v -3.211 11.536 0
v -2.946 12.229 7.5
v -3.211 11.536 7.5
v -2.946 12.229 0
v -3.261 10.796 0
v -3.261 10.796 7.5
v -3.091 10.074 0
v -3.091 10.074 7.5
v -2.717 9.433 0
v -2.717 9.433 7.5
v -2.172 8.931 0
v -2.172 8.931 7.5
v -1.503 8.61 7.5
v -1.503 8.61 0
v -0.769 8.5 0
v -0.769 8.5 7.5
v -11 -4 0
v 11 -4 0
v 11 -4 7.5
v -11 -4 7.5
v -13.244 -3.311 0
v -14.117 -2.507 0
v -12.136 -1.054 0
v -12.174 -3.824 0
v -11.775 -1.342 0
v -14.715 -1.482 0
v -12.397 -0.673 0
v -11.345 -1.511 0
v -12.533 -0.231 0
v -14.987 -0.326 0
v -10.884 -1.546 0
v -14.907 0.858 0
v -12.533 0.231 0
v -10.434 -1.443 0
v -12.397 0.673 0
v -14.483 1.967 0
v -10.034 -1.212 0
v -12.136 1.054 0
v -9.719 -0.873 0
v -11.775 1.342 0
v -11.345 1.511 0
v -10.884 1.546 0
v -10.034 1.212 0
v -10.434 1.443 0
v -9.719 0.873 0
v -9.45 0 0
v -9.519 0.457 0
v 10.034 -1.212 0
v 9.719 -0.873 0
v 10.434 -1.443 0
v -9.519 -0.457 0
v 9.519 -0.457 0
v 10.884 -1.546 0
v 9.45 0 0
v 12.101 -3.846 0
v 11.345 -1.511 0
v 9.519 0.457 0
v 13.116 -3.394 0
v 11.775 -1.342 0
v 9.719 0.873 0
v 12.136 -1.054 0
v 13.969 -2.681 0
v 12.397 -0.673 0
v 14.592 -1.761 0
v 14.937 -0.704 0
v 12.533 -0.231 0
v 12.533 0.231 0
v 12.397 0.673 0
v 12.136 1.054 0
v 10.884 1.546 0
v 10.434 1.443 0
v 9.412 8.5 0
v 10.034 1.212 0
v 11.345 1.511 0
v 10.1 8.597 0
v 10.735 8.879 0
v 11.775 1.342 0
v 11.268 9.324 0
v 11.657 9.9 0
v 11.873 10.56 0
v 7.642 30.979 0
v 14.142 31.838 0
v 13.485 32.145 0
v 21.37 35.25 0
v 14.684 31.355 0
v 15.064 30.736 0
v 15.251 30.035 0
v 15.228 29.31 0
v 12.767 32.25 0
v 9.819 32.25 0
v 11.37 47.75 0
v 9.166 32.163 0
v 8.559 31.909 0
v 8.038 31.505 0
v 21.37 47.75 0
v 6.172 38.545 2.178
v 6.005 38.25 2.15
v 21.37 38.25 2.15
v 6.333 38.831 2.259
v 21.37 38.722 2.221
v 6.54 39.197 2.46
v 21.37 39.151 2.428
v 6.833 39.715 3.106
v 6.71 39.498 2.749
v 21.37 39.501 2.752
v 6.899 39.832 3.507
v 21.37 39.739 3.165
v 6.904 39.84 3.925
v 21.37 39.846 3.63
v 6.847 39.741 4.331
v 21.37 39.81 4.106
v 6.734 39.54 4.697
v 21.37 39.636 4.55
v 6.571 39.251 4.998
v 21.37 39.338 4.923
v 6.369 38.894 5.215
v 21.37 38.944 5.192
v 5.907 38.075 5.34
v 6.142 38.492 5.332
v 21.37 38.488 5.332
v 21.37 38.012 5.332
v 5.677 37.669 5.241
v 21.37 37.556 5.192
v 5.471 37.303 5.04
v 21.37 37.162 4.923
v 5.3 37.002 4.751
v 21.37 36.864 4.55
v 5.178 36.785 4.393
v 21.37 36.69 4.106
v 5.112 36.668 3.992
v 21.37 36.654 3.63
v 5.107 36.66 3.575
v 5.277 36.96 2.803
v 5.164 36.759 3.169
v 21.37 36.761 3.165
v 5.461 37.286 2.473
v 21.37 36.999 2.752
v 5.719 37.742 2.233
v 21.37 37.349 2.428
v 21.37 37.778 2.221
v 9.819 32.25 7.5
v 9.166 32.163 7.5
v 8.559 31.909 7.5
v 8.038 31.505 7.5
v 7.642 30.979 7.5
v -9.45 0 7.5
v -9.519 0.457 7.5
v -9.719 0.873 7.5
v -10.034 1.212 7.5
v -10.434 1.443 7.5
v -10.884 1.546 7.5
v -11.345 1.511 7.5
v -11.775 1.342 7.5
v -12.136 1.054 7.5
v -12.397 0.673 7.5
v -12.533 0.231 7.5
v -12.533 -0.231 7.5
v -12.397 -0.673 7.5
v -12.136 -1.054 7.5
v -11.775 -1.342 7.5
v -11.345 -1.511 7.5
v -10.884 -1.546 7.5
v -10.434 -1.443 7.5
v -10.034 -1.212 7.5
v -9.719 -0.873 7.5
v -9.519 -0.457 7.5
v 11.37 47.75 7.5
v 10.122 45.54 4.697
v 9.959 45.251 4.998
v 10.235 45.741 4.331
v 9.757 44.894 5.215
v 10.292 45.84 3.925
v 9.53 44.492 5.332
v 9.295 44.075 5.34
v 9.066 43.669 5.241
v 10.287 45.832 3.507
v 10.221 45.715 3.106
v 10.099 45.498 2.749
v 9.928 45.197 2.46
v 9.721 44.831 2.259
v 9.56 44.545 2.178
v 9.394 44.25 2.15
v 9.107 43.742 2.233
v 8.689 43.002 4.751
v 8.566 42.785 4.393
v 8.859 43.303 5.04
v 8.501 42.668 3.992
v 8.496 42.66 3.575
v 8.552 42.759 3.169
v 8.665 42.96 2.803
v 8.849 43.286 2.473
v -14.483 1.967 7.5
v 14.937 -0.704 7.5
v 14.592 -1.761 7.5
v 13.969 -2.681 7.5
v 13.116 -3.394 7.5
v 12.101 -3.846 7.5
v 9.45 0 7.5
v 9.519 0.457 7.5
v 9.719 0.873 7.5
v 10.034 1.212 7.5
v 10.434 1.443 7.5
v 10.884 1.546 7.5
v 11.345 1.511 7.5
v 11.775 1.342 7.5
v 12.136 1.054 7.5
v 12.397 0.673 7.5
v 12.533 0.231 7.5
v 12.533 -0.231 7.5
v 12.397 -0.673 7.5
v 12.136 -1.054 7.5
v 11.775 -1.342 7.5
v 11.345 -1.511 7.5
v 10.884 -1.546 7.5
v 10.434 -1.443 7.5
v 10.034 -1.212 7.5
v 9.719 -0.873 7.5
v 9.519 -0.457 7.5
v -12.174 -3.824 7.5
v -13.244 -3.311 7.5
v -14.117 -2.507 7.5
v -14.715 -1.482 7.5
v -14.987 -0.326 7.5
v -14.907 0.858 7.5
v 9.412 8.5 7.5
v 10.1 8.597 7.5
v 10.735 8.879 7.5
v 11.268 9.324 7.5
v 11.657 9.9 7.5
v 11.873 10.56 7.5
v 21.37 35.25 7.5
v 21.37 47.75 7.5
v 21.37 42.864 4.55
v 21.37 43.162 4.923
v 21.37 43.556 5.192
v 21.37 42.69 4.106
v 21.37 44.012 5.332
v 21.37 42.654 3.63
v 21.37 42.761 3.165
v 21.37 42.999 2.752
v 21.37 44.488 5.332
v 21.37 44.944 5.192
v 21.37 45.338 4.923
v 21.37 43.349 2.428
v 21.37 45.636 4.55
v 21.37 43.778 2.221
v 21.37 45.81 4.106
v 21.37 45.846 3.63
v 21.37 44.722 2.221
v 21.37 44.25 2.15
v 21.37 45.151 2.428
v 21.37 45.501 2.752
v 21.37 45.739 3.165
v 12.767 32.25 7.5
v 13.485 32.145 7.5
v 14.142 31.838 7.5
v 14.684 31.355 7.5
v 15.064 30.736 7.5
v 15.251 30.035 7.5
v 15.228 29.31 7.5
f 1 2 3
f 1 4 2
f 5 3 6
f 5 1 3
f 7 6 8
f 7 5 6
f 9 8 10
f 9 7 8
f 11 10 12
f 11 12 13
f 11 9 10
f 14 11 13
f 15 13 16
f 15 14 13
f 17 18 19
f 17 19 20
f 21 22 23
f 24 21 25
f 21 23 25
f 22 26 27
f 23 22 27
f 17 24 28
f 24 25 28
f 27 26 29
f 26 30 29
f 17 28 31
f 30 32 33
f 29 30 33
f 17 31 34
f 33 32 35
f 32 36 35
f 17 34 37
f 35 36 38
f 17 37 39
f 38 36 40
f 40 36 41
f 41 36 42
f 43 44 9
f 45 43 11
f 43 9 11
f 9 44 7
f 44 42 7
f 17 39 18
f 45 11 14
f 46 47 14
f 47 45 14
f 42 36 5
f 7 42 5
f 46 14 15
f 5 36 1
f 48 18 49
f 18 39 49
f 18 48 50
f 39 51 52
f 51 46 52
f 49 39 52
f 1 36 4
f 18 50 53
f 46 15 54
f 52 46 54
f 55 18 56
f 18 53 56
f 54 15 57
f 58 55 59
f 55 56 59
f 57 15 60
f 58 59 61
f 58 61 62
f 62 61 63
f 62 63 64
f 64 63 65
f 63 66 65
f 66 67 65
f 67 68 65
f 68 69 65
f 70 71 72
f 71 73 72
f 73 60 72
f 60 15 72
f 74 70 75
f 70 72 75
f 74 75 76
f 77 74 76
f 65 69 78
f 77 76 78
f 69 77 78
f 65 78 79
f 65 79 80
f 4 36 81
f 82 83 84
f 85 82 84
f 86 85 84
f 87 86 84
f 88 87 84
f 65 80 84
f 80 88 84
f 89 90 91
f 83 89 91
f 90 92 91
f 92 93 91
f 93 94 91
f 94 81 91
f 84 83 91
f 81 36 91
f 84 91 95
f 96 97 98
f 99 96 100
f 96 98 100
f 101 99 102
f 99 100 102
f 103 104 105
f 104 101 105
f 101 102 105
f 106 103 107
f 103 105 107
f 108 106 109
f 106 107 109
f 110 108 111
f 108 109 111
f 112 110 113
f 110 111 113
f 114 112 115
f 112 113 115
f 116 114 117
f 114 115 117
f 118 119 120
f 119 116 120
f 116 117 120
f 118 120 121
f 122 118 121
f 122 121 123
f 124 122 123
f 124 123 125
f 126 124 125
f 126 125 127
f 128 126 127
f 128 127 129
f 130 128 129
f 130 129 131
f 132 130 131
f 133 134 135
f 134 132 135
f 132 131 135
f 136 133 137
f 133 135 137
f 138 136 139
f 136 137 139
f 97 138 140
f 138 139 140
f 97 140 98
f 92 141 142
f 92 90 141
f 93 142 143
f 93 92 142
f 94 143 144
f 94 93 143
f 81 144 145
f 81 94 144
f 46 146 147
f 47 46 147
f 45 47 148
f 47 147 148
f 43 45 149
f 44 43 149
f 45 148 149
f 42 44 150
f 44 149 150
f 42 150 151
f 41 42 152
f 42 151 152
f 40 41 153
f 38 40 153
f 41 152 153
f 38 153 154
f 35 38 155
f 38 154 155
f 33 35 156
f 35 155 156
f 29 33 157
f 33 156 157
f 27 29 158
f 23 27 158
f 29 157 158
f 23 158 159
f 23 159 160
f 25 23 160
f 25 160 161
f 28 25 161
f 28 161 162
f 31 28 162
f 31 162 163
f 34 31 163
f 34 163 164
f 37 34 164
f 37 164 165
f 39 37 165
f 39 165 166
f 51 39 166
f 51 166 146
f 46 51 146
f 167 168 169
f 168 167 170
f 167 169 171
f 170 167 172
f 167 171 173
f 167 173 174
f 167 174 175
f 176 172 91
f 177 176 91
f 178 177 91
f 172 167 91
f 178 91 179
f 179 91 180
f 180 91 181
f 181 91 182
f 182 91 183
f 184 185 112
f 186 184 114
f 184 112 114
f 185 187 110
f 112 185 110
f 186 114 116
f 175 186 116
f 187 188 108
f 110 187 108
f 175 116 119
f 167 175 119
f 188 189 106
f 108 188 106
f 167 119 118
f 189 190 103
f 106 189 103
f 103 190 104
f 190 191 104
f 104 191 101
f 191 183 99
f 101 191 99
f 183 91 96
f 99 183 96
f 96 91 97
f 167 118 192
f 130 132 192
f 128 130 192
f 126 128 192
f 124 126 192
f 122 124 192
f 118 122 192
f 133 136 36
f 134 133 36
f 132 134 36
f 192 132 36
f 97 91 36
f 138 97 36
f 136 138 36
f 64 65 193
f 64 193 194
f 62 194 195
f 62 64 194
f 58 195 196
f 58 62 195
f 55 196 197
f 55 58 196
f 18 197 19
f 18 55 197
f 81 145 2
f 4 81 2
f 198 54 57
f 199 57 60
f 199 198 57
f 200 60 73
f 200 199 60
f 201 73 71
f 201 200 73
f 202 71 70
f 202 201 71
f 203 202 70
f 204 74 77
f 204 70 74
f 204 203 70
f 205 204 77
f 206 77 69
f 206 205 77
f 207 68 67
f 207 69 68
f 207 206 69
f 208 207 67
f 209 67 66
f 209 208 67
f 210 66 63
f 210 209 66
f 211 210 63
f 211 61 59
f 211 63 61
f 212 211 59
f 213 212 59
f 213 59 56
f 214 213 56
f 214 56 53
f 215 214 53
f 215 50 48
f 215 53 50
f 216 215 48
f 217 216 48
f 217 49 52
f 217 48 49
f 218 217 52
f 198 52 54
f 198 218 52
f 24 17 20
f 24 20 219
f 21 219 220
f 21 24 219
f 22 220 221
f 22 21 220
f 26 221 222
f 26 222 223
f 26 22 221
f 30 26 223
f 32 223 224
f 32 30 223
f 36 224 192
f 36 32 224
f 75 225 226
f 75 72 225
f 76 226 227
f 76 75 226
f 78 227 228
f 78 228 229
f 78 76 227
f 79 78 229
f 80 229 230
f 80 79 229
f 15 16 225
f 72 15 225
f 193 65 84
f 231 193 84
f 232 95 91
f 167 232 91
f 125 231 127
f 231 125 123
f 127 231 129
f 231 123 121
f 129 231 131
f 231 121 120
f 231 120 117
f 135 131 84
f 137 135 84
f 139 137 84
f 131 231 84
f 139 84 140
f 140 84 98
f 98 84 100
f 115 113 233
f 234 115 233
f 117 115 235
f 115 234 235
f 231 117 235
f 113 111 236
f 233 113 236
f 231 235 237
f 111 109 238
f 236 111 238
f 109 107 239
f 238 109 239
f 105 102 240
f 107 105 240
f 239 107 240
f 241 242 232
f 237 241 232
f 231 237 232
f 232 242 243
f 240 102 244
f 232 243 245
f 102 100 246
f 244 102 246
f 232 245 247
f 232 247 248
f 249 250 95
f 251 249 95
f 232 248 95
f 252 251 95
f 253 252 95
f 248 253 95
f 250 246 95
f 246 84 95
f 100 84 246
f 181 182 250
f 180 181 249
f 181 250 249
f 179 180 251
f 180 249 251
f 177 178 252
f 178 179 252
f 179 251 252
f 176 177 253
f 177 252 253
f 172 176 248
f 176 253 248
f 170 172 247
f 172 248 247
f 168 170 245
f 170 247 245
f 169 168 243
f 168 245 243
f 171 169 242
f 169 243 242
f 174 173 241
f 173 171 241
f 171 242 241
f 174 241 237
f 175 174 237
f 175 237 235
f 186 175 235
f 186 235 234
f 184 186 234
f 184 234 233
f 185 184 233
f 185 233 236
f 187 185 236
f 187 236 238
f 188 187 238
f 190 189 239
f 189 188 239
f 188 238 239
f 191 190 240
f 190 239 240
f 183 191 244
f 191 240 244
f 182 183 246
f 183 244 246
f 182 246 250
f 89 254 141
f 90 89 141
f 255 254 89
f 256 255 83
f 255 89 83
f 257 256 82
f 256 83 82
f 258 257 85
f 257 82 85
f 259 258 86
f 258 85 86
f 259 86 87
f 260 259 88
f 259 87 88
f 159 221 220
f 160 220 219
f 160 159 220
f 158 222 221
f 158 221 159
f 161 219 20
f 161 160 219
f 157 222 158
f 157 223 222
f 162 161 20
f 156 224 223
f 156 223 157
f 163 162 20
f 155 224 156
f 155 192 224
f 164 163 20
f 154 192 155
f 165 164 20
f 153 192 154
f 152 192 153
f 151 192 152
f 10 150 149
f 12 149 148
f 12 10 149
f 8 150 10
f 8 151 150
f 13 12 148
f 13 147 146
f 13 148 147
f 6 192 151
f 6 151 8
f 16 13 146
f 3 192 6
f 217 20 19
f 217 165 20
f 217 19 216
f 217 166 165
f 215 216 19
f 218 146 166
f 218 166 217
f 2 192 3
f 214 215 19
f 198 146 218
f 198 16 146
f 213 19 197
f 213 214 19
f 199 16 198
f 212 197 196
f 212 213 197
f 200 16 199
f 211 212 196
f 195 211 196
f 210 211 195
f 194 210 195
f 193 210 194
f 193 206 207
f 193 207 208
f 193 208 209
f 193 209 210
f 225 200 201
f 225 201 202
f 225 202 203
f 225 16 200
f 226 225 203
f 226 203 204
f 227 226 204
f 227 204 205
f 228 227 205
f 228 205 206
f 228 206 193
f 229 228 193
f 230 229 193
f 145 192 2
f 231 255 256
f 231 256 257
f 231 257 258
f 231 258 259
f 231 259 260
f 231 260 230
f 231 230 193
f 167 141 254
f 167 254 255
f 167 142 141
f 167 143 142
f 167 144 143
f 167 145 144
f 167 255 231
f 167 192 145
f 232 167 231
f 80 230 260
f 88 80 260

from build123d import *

# Parameters (mm, degrees)
BOSS_EXTRUDE1_DEPTH = 7.5
SKETCH2_R           = 1.55
CUT_EXTRUDE1_DEPTH  = 18.24093965
BOSS_EXTRUDE6_START = -7.5
BOSS_EXTRUDE6_DEPTH = 7.5
CUT_EXTRUDE2_REACH  = 62.49
SKETCH13_R          = 1.6
CUT_EXTRUDE8_DEPTH  = 53.848740761
FILLET1_R           = 2.5


with BuildPart() as part:
    # Sketch1 → Boss-Extrude1 (new body)
    with BuildSketch(Plane.XY):
        with BuildLine():
            Line((-11, 4), (11, 4))
            ThreePointArc((11, 4), (15, 0), (11, -4))
            Line((11, -4), (-11, -4))
            ThreePointArc((-11, -4), (-15, 0), (-11, 4))
        make_face()
    extrude(amount=BOSS_EXTRUDE1_DEPTH)

    # Sketch2 → Cut-Extrude1 (cut, through all)
    with BuildSketch(Plane.XY.offset(7.5)):
        with Locations((-11, 0)):
            Circle(SKETCH2_R)
    cut_extrude1 = extrude(amount=-CUT_EXTRUDE1_DEPTH, mode=Mode.SUBTRACT)

    # Mirror1: Cut-Extrude1 across plane
    add(cut_extrude1.mirror(Plane(origin=(0, 0, 0), x_dir=(0, 0, 1), z_dir=(1, 0, 0))), mode=Mode.SUBTRACT)

    # Sketch12 → Boss-Extrude6 (add)
    with BuildSketch(Plane.XY.offset(7.5).offset(BOSS_EXTRUDE6_START)):
        with BuildLine():
            Line((21.37, 35.25), (21.37, 47.75))
            Line((21.37, 47.75), (11.37, 47.75))
            Line((11.37, 47.75), (-14.48304631, 1.966821905))
            ThreePointArc((-14.48304631, 1.966821905), (-13.016520813, 3.454510647), (-11, 4))
            Line((-11, 4), (11, 4))
            ThreePointArc((11, 4), (14.067391334, 2.567315797), (14.937481114, -0.704444799))
            Line((14.937481114, -0.704444799), (21.37, 35.25))
        make_face()
    extrude(amount=BOSS_EXTRUDE6_DEPTH)

    # Cut-Extrude2: up to this plane
    cut_extrude2_end = Plane(origin=(-11.823529281, 6.676562501, -60.276646808), z_dir=(-0.870761577419204, 0.49170547616476634, 0))
    # Sketch13 → Cut-Extrude2 (cut, up to the surface)
    with BuildSketch(Plane(origin=(21.37, 0, 0), x_dir=(0, 0, -1), z_dir=(1, 0, 0)), mode=Mode.PRIVATE) as cut_extrude2_sk1:
        with Locations((-3.75, 38.25)):
            Circle(SKETCH13_R)
    cut_extrude2_tool1 = split(extrude(cut_extrude2_sk1.sketch, amount=-CUT_EXTRUDE2_REACH, mode=Mode.PRIVATE), bisect_by=cut_extrude2_end, keep=Keep.BOTH, mode=Mode.PRIVATE)
    add(cut_extrude2_tool1.solids().sort_by_distance((21.37, 38.25, 3.75))[0], mode=Mode.SUBTRACT)
    # Sketch13 → Cut-Extrude2 (cut, up to the surface)
    with BuildSketch(Plane(origin=(21.37, 0, 0), x_dir=(0, 0, -1), z_dir=(1, 0, 0)), mode=Mode.PRIVATE) as cut_extrude2_sk2:
        with Locations((-3.75, 44.25)):
            Circle(SKETCH13_R)
    cut_extrude2_tool2 = split(extrude(cut_extrude2_sk2.sketch, amount=-CUT_EXTRUDE2_REACH, mode=Mode.PRIVATE), bisect_by=cut_extrude2_end, keep=Keep.BOTH, mode=Mode.PRIVATE)
    add(cut_extrude2_tool2.solids().sort_by_distance((21.37, 44.25, 3.75))[0], mode=Mode.SUBTRACT)

    # Sketch15 → Cut-Extrude8 (cut, through all)
    with BuildSketch(Plane.XY.offset(7.5)):
        Polygon((15.753888137, 32.25), (8.359491787, 32.25), (-5.051762639, 8.5), (11.504835638, 8.5), align=None)
    extrude(amount=-CUT_EXTRUDE8_DEPTH, mode=Mode.SUBTRACT)

    # Fillet1
    fillet1_edges = [part.edges().sort_by_distance(p)[0] for p in [
        (8.359491787, 32.25, 3.75),
        (15.753888137, 32.25, 3.75),
        (11.504835638, 8.5, 3.75),
        (-5.051762639, 8.5, 3.75),
    ]]
    fillet(fillet1_edges, radius=FILLET1_R)


solid = part.part
